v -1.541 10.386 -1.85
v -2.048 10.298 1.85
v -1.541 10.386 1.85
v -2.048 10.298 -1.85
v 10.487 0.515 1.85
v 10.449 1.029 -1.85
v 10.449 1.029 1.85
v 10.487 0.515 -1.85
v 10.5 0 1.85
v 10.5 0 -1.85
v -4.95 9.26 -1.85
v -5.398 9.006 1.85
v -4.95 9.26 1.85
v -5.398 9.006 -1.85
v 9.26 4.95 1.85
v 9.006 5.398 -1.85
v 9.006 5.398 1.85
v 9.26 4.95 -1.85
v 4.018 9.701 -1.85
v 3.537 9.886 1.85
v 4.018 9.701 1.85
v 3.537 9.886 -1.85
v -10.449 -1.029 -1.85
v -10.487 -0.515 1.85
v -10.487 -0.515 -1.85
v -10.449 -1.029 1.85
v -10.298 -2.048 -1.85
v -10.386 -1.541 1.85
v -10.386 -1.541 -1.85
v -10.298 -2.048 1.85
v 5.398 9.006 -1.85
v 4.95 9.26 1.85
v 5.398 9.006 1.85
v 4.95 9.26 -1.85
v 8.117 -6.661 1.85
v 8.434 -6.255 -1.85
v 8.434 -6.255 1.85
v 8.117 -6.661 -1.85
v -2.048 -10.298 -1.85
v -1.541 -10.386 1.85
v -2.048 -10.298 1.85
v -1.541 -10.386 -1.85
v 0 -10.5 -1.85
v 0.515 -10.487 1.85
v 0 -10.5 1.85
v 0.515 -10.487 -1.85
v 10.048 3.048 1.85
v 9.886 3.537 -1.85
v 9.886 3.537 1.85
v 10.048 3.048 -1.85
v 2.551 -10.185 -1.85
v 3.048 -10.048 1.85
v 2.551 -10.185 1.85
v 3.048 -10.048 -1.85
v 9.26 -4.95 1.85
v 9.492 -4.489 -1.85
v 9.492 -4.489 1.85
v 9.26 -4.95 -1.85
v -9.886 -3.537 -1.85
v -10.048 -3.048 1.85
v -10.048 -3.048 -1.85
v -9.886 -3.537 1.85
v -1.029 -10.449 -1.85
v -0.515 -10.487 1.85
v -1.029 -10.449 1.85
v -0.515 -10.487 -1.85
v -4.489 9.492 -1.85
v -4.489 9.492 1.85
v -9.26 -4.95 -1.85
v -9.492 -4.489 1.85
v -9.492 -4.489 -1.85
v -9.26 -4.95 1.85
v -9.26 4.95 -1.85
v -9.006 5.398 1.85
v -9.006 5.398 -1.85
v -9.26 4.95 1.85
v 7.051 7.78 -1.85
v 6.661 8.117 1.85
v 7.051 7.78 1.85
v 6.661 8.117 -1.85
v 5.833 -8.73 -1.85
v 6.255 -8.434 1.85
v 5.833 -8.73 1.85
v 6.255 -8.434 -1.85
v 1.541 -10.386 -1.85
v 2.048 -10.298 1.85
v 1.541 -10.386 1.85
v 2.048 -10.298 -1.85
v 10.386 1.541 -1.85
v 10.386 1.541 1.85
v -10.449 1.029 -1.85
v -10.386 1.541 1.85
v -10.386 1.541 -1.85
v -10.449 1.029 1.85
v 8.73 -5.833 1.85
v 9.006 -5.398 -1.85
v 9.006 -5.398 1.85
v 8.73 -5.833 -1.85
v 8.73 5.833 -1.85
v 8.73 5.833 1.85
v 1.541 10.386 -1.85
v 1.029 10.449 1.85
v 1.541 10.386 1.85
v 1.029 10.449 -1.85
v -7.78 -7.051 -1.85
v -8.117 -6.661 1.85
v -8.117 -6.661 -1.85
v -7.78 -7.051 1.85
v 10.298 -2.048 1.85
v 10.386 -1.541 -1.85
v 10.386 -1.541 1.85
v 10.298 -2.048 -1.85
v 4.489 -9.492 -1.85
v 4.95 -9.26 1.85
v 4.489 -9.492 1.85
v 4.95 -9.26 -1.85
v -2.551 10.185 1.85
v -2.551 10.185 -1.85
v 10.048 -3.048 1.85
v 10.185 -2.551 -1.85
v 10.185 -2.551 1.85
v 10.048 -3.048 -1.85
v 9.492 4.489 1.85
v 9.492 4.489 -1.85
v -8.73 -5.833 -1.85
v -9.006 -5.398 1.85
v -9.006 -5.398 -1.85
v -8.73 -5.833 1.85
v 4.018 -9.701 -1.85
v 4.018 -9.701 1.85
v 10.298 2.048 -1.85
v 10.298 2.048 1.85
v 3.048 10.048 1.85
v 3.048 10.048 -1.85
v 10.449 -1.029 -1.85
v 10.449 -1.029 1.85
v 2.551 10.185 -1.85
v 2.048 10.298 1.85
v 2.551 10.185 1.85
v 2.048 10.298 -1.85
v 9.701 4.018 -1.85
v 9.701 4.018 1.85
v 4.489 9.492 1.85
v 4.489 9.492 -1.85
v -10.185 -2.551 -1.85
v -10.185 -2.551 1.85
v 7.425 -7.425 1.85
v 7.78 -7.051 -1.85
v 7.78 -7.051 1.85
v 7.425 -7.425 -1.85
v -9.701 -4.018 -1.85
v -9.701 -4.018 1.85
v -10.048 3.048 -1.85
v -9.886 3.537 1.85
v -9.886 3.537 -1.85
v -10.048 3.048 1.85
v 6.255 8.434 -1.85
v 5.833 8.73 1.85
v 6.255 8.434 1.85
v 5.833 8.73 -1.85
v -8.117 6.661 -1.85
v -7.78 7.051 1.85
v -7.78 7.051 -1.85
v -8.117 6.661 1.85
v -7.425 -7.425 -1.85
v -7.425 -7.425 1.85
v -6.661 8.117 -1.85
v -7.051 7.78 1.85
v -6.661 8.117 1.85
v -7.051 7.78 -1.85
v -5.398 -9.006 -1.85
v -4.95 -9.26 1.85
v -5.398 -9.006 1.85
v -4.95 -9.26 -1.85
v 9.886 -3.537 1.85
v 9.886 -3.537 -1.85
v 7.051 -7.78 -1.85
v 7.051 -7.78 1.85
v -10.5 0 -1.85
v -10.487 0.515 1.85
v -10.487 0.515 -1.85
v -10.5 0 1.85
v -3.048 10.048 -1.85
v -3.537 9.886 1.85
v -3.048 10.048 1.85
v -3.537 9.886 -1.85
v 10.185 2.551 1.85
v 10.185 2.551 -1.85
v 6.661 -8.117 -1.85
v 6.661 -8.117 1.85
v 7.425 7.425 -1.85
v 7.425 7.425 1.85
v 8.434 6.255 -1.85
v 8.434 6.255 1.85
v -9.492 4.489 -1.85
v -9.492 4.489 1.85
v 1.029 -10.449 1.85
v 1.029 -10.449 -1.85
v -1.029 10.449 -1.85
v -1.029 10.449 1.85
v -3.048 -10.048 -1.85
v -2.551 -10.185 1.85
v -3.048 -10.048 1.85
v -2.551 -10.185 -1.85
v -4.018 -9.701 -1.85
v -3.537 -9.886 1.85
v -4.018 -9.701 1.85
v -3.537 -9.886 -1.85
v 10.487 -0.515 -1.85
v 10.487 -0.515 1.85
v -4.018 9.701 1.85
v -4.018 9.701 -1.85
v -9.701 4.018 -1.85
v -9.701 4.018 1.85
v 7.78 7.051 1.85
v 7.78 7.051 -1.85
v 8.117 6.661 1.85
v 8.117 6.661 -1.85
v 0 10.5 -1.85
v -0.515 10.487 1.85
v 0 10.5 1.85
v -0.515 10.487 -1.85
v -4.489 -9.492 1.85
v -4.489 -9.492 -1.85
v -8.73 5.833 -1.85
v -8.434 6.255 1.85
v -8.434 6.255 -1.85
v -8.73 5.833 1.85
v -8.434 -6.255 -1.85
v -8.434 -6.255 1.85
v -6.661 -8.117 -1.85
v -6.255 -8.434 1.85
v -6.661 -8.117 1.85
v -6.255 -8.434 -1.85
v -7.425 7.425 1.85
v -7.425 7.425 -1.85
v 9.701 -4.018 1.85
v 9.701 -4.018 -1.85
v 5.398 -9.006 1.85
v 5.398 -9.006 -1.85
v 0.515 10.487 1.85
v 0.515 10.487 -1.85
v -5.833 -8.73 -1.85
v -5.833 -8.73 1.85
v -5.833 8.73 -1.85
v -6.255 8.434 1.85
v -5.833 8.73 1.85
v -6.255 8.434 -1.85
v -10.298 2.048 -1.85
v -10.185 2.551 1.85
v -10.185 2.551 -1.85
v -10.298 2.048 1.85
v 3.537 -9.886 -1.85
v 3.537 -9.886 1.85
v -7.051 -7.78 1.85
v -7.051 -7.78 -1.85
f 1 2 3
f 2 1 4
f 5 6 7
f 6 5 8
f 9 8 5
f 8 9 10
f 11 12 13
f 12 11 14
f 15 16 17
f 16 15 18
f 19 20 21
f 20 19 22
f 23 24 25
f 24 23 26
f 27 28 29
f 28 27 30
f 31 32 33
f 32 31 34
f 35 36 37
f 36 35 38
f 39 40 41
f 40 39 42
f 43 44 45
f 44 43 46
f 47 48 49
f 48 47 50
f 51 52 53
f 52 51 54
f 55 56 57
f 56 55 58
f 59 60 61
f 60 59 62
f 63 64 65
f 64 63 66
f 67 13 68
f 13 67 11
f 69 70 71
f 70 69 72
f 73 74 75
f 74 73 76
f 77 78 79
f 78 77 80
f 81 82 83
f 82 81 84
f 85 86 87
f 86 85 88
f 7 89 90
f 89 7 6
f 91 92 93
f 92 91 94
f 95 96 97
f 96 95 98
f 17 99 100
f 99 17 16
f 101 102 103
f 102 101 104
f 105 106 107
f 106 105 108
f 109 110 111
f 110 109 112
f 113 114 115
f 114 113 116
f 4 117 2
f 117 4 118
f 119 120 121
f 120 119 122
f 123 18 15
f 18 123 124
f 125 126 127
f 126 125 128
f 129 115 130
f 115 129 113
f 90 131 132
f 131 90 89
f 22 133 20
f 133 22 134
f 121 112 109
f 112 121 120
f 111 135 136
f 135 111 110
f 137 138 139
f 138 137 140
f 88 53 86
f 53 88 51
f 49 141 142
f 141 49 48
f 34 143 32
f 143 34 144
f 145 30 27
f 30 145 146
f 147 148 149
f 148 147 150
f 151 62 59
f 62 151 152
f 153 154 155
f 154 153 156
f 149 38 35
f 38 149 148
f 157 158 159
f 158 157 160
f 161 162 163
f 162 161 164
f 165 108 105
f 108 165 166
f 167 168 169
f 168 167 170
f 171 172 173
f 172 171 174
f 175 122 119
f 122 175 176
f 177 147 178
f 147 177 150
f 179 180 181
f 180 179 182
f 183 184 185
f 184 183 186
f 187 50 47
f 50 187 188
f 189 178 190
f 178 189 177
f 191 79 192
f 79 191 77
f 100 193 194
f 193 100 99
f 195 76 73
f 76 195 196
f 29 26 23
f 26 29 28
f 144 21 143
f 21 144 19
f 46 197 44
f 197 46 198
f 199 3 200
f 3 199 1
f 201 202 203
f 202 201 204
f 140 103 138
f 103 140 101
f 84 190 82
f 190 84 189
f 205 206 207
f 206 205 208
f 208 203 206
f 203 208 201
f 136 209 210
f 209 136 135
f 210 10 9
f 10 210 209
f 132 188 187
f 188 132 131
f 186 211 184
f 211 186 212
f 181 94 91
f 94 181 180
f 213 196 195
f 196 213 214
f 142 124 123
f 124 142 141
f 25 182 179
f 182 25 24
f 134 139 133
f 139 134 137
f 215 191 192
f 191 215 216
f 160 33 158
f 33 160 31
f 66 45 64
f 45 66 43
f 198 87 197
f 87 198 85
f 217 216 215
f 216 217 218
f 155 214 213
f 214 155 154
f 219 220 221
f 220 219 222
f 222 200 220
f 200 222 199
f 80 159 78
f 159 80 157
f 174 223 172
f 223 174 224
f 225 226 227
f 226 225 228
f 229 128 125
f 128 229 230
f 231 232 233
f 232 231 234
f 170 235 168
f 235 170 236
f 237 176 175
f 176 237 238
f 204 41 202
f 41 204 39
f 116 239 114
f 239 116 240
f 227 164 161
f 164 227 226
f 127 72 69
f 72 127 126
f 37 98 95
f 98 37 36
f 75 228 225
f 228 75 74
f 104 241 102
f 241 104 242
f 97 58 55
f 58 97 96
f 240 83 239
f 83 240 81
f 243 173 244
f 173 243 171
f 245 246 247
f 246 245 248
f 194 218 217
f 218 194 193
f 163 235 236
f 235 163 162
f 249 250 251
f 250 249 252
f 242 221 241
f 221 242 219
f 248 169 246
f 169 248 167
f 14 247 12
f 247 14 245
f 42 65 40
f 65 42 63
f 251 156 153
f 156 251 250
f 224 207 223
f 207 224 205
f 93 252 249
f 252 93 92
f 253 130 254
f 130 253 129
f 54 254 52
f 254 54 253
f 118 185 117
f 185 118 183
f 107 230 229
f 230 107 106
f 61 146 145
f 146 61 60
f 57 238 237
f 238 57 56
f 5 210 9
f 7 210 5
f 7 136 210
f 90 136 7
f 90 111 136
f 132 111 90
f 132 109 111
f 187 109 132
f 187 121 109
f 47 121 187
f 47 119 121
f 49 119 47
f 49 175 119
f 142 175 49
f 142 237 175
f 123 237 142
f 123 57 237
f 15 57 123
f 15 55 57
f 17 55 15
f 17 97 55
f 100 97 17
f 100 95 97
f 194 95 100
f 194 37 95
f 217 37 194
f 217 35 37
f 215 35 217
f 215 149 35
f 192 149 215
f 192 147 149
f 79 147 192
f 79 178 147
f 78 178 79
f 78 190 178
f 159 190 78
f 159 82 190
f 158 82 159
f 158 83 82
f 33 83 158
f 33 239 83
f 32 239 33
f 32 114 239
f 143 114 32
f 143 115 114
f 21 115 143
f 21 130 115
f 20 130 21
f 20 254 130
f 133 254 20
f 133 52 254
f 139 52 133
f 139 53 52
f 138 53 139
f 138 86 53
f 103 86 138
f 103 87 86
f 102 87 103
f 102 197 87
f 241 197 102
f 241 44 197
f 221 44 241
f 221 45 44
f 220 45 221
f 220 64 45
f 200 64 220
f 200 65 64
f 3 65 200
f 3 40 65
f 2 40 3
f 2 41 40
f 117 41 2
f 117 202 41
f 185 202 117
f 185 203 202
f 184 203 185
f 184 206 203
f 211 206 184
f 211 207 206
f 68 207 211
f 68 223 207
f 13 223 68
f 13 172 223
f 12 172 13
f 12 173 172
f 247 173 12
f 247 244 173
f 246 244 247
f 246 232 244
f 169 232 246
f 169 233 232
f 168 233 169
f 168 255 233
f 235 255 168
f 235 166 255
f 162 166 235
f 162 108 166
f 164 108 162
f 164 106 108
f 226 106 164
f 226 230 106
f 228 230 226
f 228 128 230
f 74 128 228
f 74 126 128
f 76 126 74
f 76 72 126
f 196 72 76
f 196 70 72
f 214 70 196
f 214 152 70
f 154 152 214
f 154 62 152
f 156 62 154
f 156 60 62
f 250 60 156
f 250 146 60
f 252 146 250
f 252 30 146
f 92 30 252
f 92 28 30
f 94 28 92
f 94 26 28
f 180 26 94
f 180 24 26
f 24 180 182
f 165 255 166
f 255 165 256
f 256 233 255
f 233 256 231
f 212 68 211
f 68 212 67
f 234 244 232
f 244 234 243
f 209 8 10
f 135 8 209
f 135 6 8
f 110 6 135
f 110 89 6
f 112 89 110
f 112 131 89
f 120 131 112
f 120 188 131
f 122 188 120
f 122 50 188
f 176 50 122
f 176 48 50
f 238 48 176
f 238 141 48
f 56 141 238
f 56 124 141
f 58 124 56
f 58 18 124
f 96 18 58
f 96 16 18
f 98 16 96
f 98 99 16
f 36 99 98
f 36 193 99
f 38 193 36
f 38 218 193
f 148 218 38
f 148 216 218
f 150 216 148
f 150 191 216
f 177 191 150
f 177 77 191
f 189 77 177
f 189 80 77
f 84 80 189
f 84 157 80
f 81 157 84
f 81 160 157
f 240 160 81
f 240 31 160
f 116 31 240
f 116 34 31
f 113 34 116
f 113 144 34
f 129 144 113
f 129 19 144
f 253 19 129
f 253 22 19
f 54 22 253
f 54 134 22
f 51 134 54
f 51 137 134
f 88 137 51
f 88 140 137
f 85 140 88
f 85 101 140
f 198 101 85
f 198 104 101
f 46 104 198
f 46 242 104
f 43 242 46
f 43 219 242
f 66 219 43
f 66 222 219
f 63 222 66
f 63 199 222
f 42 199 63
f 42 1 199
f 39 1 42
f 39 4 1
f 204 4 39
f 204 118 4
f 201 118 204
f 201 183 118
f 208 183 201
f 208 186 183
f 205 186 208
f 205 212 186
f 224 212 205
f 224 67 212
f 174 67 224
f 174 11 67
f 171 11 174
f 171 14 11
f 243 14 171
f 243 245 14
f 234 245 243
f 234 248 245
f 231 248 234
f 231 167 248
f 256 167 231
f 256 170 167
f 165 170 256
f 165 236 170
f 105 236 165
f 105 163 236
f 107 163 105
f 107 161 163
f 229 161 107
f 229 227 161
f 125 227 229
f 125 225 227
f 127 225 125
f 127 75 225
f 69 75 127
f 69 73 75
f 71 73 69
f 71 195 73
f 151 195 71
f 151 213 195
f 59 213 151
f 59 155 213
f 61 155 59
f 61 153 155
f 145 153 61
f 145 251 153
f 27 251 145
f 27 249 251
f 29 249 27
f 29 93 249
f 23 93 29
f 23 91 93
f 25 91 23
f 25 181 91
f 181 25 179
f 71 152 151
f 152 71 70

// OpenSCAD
$fn = 128;

r = 10.5;
h = 3.7;
t = 13.5;

difference() {
  cylinder(h = h, r = r, center = true);
  cylinder(h = h + 0.2, r = max(0, r - t), center = true);
}
